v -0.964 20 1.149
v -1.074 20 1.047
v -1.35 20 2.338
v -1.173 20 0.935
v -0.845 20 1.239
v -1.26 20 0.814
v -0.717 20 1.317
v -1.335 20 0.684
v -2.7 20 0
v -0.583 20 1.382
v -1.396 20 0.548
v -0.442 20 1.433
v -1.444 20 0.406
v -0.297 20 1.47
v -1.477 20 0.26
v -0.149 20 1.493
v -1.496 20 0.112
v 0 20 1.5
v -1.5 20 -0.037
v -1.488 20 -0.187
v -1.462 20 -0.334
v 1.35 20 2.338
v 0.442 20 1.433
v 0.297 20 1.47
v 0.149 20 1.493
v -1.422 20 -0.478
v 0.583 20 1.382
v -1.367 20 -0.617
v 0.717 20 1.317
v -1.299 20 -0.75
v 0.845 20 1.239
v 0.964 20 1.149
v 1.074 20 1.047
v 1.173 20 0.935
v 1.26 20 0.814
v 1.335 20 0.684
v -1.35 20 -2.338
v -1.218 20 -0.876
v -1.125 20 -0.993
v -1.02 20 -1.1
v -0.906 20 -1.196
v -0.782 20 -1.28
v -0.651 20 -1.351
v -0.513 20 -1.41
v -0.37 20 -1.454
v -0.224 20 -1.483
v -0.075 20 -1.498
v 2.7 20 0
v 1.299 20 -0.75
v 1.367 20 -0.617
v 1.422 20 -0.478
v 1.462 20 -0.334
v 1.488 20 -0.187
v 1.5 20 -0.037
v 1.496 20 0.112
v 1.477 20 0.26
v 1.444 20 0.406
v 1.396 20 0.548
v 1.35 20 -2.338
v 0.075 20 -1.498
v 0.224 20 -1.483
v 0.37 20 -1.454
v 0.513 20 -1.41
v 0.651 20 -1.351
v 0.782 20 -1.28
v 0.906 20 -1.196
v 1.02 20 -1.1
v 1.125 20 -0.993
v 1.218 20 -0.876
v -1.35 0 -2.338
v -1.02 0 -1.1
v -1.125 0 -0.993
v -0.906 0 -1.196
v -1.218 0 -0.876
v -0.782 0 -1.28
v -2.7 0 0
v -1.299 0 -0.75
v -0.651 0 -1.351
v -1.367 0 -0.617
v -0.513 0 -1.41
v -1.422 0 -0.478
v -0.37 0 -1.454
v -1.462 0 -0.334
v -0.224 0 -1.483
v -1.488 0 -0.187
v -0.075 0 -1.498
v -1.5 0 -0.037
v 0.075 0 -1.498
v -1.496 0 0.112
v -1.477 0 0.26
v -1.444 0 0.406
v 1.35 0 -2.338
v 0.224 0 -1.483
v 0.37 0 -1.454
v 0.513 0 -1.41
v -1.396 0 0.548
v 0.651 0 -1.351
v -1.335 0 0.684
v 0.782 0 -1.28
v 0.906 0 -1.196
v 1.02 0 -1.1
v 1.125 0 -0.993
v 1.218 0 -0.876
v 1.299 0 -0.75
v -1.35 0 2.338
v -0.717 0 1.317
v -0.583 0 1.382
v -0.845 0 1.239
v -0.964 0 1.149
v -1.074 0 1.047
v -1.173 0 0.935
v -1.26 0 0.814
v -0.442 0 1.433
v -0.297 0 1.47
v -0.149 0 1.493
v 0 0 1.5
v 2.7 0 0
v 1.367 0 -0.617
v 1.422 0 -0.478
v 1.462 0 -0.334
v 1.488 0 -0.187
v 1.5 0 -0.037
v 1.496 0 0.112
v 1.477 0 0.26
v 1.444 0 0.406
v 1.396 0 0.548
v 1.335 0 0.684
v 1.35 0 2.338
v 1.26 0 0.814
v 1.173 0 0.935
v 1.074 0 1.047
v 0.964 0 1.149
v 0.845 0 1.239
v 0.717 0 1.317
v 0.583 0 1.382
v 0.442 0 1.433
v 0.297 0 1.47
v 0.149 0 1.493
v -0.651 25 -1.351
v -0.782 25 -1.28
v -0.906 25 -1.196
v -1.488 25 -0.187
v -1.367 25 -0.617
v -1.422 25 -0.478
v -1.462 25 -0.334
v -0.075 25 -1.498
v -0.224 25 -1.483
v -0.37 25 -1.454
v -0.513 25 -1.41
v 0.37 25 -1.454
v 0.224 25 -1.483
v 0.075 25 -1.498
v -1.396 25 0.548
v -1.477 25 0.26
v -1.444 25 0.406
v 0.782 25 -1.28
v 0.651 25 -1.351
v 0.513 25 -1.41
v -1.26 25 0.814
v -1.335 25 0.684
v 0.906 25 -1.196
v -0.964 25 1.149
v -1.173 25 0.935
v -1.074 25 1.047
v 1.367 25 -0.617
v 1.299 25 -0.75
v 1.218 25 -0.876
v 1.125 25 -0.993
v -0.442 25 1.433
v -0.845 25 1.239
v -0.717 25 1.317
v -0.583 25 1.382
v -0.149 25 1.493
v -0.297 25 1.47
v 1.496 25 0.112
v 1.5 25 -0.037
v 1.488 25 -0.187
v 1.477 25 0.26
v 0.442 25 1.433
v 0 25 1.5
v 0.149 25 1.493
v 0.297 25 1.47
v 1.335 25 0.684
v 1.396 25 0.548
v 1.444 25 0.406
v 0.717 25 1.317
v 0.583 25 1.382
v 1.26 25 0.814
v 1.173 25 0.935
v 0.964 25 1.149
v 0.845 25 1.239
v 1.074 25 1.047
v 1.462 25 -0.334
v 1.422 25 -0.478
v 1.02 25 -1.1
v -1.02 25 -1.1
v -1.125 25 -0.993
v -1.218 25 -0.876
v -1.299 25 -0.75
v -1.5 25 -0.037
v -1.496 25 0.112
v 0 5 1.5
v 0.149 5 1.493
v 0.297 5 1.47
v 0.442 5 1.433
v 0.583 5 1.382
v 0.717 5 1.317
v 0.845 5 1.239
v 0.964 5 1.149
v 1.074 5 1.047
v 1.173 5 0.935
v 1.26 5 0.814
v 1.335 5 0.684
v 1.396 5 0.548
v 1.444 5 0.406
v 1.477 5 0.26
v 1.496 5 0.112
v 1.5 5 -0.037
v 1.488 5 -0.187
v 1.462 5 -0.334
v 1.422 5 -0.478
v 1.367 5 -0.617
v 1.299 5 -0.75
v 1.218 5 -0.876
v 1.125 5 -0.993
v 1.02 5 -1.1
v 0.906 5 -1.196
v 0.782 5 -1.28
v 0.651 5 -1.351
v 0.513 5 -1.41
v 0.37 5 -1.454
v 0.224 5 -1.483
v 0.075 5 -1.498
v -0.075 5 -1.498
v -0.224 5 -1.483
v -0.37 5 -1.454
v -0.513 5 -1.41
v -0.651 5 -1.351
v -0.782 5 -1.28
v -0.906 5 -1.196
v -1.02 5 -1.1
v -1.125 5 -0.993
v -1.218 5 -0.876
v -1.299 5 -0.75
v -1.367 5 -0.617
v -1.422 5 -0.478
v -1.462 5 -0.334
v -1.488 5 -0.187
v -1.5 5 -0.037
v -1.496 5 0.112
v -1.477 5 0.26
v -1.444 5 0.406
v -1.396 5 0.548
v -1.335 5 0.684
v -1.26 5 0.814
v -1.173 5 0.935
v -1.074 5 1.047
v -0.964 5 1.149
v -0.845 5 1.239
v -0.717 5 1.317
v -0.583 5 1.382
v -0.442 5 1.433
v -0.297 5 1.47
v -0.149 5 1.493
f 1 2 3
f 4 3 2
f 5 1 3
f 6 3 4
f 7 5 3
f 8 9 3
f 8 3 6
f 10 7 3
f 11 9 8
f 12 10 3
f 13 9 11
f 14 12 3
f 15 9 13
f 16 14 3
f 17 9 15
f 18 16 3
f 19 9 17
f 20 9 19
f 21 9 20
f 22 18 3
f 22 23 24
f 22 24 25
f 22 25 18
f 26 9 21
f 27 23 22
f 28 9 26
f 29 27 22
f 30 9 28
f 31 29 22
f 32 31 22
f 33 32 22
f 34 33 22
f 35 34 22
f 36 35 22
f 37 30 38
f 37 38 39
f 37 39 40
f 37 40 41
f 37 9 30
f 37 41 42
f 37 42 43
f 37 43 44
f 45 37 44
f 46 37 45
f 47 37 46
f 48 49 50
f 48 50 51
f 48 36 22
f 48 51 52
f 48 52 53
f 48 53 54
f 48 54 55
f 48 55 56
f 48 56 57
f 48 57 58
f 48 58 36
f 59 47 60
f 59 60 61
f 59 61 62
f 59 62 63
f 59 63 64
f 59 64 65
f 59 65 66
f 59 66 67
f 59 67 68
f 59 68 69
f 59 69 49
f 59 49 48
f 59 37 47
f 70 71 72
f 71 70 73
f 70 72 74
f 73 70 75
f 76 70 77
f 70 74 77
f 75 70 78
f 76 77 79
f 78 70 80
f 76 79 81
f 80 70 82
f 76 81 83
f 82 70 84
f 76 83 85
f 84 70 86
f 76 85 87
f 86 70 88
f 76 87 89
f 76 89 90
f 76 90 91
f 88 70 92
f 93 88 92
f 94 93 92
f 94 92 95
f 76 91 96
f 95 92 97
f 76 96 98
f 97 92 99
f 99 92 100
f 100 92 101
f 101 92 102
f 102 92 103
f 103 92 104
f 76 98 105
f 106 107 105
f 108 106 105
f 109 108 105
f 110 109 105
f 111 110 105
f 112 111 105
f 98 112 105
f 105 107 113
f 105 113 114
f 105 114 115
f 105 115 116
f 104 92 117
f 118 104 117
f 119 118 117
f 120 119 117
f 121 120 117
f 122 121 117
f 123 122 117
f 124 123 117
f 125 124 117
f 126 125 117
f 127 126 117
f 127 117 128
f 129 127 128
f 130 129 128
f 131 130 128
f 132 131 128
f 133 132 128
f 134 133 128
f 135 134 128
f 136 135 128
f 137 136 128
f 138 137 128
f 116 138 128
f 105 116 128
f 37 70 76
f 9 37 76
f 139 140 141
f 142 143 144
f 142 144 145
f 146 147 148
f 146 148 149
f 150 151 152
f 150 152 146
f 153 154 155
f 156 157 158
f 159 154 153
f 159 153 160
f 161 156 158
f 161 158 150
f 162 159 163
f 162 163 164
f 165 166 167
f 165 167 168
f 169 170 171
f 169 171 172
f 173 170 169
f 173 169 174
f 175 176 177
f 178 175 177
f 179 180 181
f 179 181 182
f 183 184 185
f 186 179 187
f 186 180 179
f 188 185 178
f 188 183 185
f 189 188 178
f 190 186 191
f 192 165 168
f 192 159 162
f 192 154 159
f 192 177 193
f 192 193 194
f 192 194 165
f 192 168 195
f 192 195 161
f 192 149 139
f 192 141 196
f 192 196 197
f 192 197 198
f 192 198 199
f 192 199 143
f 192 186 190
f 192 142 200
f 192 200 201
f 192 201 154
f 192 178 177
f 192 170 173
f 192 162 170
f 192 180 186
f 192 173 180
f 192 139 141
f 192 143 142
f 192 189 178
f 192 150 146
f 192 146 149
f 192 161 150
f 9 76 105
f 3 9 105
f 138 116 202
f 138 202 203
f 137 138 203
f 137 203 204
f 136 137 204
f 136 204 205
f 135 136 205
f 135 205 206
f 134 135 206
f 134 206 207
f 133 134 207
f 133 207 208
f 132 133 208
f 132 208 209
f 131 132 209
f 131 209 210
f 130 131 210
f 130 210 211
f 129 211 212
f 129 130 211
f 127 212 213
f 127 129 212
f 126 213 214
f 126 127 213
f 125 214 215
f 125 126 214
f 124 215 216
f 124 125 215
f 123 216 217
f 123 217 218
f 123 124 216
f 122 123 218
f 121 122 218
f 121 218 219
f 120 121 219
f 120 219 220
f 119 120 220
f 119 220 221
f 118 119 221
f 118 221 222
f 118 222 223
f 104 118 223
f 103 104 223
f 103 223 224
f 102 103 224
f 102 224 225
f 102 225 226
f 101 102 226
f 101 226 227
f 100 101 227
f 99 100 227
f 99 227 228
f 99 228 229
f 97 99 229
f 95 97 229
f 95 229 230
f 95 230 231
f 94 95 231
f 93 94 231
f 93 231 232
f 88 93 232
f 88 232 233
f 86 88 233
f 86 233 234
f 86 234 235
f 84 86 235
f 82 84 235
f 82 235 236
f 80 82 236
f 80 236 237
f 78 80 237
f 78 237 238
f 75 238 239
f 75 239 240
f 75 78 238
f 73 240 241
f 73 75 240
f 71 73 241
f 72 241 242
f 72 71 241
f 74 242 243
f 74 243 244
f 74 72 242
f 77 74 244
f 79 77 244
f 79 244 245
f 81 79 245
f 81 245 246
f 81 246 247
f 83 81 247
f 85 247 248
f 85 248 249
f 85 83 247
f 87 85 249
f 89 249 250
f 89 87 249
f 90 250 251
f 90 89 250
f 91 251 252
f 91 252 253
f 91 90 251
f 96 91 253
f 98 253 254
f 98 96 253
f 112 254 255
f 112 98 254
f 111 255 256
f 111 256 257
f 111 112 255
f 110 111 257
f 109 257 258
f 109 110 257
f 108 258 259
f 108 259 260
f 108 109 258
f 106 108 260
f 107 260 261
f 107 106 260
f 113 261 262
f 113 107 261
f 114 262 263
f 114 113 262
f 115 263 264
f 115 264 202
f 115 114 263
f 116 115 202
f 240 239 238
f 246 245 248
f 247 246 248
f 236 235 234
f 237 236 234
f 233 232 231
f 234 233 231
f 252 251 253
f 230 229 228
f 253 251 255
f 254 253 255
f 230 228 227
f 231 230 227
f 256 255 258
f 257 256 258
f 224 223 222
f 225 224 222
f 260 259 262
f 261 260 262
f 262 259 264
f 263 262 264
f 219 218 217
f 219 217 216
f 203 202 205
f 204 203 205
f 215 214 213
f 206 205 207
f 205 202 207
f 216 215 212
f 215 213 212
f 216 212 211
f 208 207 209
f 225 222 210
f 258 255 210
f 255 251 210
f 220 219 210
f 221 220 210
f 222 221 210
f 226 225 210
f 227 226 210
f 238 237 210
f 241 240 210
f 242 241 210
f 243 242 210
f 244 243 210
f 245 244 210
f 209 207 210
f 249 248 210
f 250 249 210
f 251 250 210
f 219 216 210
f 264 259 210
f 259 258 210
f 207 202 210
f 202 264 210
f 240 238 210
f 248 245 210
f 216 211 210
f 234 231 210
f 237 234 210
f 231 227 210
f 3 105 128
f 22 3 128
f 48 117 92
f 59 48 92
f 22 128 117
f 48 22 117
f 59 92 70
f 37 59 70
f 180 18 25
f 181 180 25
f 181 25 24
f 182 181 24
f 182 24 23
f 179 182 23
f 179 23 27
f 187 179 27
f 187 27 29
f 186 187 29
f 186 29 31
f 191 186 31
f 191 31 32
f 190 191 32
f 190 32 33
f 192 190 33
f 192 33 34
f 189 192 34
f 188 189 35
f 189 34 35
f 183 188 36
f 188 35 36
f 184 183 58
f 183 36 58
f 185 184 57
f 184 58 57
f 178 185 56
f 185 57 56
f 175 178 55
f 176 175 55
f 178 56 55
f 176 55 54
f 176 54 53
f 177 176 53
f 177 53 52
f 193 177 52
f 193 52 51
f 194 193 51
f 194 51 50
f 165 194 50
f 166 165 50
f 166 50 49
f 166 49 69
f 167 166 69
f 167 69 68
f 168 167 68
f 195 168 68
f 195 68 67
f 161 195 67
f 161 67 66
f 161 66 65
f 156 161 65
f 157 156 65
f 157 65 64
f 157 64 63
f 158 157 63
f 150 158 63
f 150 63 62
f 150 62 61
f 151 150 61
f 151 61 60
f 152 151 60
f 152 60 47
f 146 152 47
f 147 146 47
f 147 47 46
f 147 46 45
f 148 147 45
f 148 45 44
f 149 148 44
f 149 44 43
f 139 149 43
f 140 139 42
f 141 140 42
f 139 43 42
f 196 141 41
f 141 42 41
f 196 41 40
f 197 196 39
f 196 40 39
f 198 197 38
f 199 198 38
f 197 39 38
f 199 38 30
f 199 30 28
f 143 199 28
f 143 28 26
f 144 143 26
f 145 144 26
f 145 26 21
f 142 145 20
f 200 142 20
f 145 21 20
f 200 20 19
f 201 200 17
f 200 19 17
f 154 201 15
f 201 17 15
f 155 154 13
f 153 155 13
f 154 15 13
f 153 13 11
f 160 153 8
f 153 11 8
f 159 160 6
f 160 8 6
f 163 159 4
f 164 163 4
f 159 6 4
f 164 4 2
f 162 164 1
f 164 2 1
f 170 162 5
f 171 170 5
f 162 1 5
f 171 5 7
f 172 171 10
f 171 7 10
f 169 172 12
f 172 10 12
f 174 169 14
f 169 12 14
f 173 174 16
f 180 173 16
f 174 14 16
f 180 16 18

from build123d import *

# Parameters (mm, degrees)
EXTRUDE_1_DEPTH          = 20
SKETCH_2_R               = 1.5
EXTRUDE_2_DEPTH          = 25
CUT_EXTRUDE_2_DEPTH      = 5
CUT_EXTRUDE_2_DEPTH_BACK = 1
SKETCH_3_R               = 1.5


with BuildPart() as part:
    # 草图1 → 凸台-拉伸1 (new body)
    with BuildSketch(Plane(origin=(0, 0, 0), x_dir=(1, 0, 0), z_dir=(0, 1, 0))):
        Polygon((2.7, 0), (1.35, 2.33826859), (-1.35, 2.33826859), (-2.7, 0), (-1.35, -2.33826859), (1.35, -2.33826859), align=None)
    extrude(amount=EXTRUDE_1_DEPTH)

    # 草图2 → 凸台-拉伸2 (add)
    with BuildSketch(Plane(origin=(0, 0, 0), x_dir=(1, 0, 0), z_dir=(0, 1, 0))):
        with Locations(Location((0, 0, 0), (0, 0, 270))):
            Circle(SKETCH_2_R)
    extrude(amount=EXTRUDE_2_DEPTH)

    # 草图3 → 切除-拉伸2 (cut, two sides: drawn at the far end of the back side and taken through both)
    with BuildSketch(Plane(origin=(0, 0, 0), x_dir=(1, 0, 0), z_dir=(0, 1, 0)).offset(-CUT_EXTRUDE_2_DEPTH_BACK)):
        with Locations(Location((0, 0, 0), (0, 0, 270))):
            Circle(SKETCH_3_R)
    extrude(amount=CUT_EXTRUDE_2_DEPTH + CUT_EXTRUDE_2_DEPTH_BACK, mode=Mode.SUBTRACT)


solid = part.part
